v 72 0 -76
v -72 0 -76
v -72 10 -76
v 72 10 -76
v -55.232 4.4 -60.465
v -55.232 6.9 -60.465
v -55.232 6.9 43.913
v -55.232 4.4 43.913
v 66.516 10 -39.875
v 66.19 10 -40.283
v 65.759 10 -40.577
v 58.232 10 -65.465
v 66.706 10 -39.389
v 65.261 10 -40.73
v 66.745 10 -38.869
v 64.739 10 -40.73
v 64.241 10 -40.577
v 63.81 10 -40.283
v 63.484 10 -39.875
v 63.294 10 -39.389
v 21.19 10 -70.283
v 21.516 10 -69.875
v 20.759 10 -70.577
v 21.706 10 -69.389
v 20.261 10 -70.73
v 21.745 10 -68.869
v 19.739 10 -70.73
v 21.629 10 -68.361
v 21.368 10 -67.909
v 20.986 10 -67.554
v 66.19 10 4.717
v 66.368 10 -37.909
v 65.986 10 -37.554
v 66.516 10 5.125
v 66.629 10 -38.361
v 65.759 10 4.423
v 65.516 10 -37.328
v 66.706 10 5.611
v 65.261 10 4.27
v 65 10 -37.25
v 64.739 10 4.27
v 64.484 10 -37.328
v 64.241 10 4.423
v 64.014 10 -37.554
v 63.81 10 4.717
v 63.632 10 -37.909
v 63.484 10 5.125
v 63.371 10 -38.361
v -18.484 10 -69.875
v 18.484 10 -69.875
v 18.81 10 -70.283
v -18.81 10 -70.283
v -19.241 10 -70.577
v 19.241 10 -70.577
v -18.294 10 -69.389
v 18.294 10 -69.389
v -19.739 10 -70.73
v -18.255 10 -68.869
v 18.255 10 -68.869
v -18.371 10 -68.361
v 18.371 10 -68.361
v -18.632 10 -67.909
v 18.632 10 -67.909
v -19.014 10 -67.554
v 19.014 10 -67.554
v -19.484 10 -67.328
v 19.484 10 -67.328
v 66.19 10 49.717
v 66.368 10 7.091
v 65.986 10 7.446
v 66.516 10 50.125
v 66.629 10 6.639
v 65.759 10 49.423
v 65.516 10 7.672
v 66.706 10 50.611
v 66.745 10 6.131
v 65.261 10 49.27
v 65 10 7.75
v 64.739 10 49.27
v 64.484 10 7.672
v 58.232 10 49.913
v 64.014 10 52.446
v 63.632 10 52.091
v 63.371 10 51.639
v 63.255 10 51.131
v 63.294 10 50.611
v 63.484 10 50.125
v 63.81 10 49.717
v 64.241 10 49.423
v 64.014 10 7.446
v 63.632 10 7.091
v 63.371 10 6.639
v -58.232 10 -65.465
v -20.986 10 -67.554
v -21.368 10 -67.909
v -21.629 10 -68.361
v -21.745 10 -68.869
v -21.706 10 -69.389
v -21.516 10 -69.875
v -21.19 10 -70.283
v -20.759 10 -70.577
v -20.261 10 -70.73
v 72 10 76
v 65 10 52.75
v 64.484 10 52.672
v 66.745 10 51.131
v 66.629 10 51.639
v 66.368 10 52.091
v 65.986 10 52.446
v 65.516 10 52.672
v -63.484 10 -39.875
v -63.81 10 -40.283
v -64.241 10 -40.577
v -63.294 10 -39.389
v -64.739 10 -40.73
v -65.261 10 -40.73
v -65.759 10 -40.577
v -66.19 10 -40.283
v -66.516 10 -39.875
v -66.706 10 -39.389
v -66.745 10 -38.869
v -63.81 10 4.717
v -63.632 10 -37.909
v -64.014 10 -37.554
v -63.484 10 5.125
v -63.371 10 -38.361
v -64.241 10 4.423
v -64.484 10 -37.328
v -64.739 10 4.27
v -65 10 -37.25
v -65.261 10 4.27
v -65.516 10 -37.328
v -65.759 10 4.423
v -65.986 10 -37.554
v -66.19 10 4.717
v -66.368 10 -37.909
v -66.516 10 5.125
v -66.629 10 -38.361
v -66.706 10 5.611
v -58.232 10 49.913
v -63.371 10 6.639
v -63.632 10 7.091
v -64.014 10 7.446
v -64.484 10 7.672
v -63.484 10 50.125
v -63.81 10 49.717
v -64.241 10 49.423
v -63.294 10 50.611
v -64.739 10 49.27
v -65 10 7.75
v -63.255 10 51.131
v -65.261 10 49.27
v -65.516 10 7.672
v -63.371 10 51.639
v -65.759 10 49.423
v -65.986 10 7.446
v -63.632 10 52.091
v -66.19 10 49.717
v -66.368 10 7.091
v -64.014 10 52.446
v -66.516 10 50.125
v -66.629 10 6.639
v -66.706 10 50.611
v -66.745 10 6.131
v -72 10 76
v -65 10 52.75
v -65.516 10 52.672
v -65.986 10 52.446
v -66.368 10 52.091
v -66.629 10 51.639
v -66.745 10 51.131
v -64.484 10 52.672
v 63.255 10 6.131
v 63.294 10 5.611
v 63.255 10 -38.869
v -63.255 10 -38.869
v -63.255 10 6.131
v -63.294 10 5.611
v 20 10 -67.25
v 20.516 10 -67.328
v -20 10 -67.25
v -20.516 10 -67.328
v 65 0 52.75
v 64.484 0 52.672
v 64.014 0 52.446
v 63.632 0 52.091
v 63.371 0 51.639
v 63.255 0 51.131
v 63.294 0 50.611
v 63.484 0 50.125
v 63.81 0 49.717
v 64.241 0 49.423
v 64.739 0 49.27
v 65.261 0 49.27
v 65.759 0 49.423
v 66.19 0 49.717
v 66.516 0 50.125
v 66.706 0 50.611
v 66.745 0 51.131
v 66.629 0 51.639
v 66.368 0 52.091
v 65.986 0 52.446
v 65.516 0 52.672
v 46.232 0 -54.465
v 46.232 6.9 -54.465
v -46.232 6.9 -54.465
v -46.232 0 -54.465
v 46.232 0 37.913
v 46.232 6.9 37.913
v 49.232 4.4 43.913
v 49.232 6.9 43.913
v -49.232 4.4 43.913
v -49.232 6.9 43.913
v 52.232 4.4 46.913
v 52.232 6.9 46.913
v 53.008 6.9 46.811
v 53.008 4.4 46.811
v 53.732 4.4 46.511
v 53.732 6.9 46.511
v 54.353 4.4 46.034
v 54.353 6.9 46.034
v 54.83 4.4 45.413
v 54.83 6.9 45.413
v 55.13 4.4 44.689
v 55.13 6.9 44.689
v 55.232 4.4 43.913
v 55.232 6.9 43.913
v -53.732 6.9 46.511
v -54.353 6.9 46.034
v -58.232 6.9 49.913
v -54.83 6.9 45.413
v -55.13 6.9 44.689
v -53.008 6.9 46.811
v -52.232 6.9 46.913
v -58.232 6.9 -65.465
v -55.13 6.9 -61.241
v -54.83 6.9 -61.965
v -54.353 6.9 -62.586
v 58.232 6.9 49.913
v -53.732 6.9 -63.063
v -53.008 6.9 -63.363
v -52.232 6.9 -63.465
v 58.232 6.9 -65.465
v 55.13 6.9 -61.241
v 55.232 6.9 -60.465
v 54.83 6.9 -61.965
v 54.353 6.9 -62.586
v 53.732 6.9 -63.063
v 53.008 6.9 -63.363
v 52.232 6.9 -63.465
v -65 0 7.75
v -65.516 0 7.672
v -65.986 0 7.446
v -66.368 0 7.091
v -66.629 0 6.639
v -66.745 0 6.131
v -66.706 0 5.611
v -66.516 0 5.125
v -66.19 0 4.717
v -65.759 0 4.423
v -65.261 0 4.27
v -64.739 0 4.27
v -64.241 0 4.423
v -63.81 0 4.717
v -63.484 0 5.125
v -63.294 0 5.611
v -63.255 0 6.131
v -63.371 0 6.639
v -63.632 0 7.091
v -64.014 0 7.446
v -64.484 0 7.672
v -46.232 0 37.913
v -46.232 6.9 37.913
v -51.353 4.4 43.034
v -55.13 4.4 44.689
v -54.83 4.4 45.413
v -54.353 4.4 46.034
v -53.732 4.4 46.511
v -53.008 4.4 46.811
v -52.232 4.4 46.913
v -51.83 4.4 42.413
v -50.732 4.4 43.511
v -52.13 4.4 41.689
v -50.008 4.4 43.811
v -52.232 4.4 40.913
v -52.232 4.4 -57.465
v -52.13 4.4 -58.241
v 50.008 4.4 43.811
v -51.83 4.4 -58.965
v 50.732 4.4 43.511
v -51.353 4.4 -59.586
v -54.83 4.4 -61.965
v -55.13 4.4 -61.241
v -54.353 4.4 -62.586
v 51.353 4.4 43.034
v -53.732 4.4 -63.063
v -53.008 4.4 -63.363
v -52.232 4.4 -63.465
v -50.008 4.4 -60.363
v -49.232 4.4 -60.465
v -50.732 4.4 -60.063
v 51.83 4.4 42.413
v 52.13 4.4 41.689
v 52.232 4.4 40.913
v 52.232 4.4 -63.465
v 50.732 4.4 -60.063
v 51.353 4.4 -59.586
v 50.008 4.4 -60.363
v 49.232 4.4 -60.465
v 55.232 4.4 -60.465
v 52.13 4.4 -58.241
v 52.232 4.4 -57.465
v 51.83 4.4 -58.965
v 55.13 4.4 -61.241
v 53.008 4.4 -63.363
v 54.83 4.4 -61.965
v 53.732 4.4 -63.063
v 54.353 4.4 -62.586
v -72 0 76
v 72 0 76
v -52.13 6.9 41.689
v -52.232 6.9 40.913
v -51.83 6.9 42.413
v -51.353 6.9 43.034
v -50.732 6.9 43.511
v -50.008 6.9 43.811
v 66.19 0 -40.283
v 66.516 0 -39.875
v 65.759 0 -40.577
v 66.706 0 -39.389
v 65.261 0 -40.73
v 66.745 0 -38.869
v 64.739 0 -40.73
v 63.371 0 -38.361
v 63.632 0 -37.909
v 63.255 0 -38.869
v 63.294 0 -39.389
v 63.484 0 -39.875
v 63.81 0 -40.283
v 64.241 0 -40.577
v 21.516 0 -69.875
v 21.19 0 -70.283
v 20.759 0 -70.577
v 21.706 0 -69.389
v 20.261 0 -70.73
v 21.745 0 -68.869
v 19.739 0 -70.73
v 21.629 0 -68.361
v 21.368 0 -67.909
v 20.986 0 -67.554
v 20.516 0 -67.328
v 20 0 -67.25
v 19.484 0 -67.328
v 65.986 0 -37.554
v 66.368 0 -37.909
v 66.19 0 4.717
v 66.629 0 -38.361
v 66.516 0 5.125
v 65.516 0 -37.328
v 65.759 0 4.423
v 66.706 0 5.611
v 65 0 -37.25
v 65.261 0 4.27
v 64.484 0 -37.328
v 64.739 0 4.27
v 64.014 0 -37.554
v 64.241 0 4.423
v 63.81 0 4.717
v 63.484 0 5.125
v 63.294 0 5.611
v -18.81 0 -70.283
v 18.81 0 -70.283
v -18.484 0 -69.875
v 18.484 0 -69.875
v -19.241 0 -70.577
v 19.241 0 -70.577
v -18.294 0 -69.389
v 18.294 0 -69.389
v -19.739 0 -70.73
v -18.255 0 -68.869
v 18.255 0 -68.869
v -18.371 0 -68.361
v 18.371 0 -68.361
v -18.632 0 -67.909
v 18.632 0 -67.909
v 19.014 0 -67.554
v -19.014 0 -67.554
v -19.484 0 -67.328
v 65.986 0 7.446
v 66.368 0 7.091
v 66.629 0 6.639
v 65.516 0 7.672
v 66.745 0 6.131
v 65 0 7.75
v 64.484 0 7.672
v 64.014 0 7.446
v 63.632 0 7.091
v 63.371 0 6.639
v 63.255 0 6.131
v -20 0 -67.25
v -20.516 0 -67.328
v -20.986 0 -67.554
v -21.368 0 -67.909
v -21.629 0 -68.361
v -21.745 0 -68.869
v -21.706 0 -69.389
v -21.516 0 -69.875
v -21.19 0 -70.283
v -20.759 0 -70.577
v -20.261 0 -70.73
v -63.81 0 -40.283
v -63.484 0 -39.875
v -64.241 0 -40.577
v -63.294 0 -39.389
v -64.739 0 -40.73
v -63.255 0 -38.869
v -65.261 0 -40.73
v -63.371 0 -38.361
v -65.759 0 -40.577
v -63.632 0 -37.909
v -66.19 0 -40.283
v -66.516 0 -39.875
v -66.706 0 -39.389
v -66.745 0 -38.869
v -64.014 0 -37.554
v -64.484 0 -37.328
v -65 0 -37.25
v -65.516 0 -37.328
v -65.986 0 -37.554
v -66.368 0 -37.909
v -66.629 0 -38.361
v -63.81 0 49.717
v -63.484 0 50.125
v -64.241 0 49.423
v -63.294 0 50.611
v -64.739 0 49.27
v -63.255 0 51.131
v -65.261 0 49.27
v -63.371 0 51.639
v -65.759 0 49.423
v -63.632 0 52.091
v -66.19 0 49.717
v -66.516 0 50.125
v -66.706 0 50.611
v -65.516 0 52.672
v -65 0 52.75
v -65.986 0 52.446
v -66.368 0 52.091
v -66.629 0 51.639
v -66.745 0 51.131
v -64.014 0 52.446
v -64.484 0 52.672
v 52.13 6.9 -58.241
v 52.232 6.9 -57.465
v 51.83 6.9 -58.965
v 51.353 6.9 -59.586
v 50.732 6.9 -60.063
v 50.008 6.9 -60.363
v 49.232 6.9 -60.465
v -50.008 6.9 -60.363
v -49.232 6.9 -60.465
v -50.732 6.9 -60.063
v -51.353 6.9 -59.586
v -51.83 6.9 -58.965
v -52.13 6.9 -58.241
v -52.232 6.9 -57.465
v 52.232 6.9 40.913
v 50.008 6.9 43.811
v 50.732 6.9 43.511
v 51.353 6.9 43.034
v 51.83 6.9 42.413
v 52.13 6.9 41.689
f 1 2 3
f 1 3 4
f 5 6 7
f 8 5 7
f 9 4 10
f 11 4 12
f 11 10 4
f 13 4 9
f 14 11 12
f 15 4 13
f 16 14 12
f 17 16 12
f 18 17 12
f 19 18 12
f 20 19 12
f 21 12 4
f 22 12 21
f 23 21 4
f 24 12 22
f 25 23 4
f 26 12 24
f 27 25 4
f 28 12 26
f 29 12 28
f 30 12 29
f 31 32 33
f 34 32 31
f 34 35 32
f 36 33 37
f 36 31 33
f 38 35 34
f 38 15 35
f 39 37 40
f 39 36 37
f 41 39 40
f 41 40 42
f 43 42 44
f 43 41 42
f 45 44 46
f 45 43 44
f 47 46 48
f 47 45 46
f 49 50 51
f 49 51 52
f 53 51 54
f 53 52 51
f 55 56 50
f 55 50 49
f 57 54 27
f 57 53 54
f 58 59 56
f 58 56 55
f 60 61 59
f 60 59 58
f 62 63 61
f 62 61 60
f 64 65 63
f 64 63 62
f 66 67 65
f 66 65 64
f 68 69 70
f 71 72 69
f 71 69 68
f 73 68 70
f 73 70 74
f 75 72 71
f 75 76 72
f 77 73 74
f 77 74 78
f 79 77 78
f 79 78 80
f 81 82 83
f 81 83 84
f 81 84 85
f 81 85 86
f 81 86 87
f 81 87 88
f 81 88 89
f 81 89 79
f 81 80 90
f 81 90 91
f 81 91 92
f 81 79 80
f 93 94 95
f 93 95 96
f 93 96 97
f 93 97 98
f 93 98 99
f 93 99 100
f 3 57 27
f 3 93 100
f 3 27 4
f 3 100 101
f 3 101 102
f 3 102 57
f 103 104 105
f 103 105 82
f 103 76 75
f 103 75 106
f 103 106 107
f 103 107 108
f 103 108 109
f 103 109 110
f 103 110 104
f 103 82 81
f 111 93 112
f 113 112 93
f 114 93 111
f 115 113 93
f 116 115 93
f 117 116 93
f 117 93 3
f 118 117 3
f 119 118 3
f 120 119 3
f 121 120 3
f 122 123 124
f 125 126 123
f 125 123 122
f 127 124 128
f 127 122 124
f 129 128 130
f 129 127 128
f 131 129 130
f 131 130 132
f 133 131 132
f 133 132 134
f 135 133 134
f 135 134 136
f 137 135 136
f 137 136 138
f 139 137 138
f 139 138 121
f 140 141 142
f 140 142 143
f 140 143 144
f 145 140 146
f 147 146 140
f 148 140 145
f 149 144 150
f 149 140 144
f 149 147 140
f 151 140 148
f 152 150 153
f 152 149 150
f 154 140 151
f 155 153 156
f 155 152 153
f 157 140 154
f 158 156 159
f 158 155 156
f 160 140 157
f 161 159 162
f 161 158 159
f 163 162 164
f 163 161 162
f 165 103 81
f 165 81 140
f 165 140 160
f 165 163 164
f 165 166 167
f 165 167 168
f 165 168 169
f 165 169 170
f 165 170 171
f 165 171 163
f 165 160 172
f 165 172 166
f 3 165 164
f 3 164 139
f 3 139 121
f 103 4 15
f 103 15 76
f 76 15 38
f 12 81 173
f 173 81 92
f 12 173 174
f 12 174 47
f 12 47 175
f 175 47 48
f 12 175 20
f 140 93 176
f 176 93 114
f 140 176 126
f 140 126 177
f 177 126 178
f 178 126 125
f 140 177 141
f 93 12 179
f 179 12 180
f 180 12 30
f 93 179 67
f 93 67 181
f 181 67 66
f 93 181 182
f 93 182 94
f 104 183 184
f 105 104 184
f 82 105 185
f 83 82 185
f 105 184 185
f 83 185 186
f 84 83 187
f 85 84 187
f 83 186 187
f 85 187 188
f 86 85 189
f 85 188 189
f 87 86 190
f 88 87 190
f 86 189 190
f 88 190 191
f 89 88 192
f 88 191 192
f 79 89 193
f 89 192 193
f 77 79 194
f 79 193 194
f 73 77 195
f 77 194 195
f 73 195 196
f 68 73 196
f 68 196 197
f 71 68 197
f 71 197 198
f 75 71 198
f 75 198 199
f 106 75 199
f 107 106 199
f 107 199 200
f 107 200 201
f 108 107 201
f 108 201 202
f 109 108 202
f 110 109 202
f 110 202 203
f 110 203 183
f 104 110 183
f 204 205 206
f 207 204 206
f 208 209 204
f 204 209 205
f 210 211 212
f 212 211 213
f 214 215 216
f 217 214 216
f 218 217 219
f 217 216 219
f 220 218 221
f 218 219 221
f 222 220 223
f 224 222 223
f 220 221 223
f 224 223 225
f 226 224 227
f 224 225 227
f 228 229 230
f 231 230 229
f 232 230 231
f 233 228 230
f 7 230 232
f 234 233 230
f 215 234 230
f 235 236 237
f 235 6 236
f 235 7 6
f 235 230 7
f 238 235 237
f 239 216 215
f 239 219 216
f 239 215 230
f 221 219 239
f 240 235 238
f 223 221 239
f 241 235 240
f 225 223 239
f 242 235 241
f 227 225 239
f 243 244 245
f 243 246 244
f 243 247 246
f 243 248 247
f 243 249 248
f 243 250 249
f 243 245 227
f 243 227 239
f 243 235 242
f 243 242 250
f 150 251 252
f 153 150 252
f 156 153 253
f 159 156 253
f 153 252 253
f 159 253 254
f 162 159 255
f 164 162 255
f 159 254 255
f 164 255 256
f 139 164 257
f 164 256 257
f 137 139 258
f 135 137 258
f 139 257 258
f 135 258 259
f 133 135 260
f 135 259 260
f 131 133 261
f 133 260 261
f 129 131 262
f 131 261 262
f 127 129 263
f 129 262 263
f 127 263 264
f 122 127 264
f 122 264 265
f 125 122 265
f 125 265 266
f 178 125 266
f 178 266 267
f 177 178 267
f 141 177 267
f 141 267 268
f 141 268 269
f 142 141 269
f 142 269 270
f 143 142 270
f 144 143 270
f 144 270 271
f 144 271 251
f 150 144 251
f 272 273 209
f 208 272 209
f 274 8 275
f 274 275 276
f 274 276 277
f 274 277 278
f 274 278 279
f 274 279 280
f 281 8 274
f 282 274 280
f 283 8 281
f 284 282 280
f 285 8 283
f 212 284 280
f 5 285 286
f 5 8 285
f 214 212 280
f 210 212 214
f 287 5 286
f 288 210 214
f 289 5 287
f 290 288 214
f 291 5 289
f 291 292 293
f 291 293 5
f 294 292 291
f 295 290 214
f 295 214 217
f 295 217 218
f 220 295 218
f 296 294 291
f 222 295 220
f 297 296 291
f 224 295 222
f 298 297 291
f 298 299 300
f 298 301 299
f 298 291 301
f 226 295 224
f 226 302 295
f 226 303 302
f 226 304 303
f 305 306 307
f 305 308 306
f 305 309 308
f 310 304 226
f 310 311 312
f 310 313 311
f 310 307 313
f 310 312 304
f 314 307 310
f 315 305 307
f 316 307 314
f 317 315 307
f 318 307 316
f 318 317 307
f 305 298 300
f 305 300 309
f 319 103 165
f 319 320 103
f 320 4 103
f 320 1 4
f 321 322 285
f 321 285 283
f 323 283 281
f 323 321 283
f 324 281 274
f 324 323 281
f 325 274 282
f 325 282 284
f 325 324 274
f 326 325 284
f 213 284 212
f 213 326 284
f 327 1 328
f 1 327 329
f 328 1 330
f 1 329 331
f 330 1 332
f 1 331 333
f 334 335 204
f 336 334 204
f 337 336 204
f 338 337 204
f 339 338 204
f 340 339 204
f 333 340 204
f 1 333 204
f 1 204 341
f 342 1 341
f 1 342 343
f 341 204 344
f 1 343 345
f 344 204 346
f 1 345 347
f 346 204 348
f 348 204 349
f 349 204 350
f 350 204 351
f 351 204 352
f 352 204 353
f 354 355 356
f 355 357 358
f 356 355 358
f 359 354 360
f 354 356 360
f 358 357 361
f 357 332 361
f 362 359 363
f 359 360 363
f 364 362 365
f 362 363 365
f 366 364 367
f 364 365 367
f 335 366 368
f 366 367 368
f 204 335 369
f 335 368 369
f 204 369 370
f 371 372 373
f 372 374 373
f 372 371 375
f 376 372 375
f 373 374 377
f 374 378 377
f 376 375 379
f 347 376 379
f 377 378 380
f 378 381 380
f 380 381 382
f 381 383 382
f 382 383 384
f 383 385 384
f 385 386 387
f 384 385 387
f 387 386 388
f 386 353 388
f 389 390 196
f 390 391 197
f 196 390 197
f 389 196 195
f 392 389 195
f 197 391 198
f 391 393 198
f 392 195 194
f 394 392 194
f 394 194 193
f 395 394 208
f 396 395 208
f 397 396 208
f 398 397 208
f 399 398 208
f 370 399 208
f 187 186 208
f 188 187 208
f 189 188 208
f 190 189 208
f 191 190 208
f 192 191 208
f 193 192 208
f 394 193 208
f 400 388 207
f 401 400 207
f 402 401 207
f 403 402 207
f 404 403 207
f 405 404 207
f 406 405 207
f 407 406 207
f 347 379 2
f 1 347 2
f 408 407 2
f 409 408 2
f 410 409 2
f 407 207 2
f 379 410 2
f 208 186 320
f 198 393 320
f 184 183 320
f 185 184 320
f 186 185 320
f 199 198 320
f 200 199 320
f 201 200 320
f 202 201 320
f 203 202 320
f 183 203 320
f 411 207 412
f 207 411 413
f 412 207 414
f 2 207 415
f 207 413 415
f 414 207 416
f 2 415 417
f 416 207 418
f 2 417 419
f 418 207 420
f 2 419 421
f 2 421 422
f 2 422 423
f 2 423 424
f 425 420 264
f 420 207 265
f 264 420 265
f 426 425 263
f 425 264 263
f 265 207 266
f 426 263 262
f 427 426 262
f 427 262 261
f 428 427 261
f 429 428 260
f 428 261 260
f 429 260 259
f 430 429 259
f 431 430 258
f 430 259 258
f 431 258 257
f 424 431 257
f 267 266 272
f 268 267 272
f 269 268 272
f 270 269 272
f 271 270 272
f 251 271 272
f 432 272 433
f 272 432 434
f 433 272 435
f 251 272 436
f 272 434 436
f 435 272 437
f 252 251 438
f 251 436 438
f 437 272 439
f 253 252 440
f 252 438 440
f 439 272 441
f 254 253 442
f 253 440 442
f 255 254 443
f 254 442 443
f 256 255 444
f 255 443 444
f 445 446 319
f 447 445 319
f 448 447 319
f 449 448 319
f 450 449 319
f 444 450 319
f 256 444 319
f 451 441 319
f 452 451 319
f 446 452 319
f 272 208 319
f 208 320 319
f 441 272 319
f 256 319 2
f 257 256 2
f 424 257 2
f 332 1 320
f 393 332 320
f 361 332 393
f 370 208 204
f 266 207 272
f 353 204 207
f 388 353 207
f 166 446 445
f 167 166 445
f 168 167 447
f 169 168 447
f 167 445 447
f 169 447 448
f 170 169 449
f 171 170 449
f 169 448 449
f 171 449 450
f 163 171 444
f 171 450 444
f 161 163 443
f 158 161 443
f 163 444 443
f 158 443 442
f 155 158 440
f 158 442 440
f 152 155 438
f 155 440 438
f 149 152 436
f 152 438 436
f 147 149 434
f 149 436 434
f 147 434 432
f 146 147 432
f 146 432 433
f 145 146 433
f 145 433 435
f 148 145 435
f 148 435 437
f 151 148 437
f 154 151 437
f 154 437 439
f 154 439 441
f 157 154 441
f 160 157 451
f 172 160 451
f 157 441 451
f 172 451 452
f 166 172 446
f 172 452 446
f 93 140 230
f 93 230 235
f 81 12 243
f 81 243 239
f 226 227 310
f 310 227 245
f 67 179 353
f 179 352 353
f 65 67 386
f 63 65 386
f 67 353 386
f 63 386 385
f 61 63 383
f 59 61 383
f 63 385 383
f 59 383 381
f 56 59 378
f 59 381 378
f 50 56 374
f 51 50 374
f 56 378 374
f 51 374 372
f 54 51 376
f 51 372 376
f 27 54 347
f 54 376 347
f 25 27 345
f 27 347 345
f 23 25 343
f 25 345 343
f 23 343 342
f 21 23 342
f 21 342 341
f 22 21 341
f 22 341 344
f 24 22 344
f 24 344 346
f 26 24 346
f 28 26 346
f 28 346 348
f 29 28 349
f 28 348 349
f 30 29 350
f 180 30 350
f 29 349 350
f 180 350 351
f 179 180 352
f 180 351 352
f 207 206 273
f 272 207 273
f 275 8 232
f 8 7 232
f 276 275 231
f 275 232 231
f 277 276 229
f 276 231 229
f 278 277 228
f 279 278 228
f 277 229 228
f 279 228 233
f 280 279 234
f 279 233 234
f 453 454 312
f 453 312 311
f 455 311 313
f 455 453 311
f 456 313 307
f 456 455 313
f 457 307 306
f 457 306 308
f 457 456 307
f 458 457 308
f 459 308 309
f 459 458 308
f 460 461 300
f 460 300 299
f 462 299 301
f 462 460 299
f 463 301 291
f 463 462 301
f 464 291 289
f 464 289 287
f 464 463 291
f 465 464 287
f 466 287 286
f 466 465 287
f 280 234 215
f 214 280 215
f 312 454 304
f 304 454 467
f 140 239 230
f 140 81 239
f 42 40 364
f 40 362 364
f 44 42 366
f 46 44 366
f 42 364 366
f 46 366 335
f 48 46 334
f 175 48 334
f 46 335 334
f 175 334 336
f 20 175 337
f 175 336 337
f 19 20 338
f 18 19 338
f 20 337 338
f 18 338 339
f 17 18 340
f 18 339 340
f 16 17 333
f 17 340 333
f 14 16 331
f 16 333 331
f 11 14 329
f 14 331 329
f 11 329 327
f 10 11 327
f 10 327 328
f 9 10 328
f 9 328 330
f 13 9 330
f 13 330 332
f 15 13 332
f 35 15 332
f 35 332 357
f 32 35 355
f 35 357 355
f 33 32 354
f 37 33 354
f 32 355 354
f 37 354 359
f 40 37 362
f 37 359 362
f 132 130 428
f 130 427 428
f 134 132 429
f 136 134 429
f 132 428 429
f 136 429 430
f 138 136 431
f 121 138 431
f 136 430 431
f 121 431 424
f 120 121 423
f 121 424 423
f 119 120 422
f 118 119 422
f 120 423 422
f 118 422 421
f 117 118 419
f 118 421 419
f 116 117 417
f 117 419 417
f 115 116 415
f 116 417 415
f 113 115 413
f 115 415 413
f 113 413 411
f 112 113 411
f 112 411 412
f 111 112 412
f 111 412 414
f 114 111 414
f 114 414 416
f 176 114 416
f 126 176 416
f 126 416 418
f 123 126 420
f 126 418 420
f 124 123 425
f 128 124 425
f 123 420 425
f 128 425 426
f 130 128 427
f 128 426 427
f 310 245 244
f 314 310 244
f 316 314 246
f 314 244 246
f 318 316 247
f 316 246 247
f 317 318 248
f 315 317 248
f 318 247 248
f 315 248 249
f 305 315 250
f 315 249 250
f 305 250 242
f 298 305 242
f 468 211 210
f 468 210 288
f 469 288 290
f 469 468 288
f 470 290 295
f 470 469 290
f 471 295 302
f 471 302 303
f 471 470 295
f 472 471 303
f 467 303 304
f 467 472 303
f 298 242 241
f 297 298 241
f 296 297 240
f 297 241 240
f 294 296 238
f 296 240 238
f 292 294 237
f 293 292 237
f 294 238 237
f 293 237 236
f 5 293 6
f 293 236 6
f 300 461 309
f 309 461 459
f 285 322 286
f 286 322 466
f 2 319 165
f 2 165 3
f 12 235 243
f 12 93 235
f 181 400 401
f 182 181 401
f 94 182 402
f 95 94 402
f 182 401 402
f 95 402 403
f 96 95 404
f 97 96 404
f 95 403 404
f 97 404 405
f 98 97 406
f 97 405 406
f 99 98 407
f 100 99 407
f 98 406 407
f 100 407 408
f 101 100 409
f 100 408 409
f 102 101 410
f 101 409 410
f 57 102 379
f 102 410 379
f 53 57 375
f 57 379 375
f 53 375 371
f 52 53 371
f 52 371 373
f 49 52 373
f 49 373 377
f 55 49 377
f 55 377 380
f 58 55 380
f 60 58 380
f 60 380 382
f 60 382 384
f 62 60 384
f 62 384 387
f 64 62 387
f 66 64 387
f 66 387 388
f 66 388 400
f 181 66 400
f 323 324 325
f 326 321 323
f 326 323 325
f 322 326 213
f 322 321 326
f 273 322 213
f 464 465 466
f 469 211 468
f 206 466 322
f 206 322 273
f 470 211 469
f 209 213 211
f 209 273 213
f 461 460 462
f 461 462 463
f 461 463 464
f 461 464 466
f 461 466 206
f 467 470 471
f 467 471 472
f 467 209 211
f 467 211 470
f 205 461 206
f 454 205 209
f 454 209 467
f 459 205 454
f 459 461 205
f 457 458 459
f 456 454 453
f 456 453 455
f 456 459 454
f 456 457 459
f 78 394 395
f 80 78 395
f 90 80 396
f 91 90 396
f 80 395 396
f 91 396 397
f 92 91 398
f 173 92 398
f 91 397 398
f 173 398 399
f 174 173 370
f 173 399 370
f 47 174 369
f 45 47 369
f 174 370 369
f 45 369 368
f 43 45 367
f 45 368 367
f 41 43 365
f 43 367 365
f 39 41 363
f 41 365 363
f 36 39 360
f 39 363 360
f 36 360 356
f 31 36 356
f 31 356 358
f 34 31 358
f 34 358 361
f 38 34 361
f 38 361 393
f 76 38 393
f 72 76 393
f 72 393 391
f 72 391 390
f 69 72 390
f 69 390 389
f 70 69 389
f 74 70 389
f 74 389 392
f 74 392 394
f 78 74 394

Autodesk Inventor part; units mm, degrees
ref_plane "YZ Plane" through (0, 0, 0) normal (1, 0, 0) x (0, 1, 0)
ref_plane "XZ Plane" through (0, 0, 0) normal (0, 1, 0) x (-1, 0, 0)
ref_plane "XY Plane" through (0, 0, 0) normal (0, 0, 1) x (1, 0, 0)
sketch "Sketch1" plane through (0, 0, 0) normal (0, 1, 0) x (-1, 0, 0)
  line L0 (72, -76) -> (-72, -76)
  line L1 (-72, -76) -> (-72, 76)
  line L2 (-72, 76) -> (72, 76)
  line L3 (72, 76) -> (72, -76)
  line L4 (72, -76) -> (-72, 76) construction
  line L5 (-72, -76) -> (72, 76) construction
  point P0 (0, 0)
  dimension "d3" = 152
  dimension "d4" = 144
extrude "Extrusion1" add sketch "Sketch1" along normal blind 10
sketch "Sketch2" plane through (0, 10, 0) normal (0, 1, 0) x (1, 0, 0)
  line L0 (-9.5175, -400.0105) -> (-9.5175, -295.6322)
  line L1 (-12.5175, -292.6322) -> (-116.9815, -292.6322)
  line L2 (-119.9815, -295.6322) -> (-119.9815, -400.0105)
  line L3 (-116.9815, -403.0105) -> (-12.5175, -403.0105)
  circle A0 centre (0.2505, -407.097) radius 1.7294
  circle A1 centre (-129.7495, -407.097) radius 1.7294
  circle A2 centre (-84.7495, -287.097) radius 1.7294
  line L4 (-18.5175, -301.6322) -> (-110.9815, -301.6322)
  line L5 (-18.5175, -394.0105) -> (-18.5175, -301.6322)
  line L6 (-110.9815, -301.6322) -> (-110.9815, -394.0105)
  line L7 (-110.9815, -394.0105) -> (-18.5175, -394.0105)
  line L8 (-12.5175, -298.6322) -> (-12.5175, -397.0105)
  line L9 (-15.5175, -400.0105) -> (-113.9815, -400.0105)
  line L10 (-116.9815, -397.0105) -> (-116.9815, -298.6322)
  line L11 (-113.9815, -295.6322) -> (-15.5175, -295.6322)
  arc A3 (-116.9815, -397.0105) -> (-113.9815, -400.0105) centre (-113.9815, -397.0105) ccw
  arc A4 (-119.9815, -400.0105) -> (-116.9815, -403.0105) centre (-116.9815, -400.0105) ccw
  arc A5 (-15.5175, -400.0105) -> (-12.5175, -397.0105) centre (-15.5175, -397.0105) ccw
  arc A6 (-12.5175, -403.0105) -> (-9.5175, -400.0105) centre (-12.5175, -400.0105) ccw
  arc A7 (-9.5175, -295.6322) -> (-12.5175, -292.6322) centre (-12.5175, -295.6322) ccw
  arc A8 (-12.5175, -298.6322) -> (-15.5175, -295.6322) centre (-15.5175, -298.6322) ccw
  arc A9 (-116.9815, -292.6322) -> (-119.9815, -295.6322) centre (-116.9815, -295.6322) ccw
  arc A10 (-113.9815, -295.6322) -> (-116.9815, -298.6322) centre (-113.9815, -298.6322) ccw
  line L12 (-46.232, -37.913) -> (46.232, -37.913)
  line L13 (46.232, -37.913) -> (46.232, 54.465)
  line L14 (46.232, 54.465) -> (-46.232, 54.465)
  line L15 (-46.232, 54.465) -> (-46.232, -37.913)
  line L16 (72, -76) -> (72, 76) construction
  line L17 (72, 76) -> (-72, 76) construction
  point P0 (0, 0)
  point P1 (-67.2495, -360.597)
  dimension "d7" = 9
  dimension "d8" = 9
  dimension "d9" = 9
  dimension "d10" = 9
  dimension "d11" = 3
  dimension "d12" = 3
  dimension "d13" = 92.378
  dimension "d14" = 92.464
  dimension "d15" = 25.768
  dimension "d16" = 21.535
  dimension "d19" = 144
  dimension "d20" = 152
extrude "Extrusion2" cut sketch "Sketch2" against normal blind 10 contours L15 L14 L13 L12
sketch "Sketch3" plane through (0, 10, 0) normal (0, 1, 0) x (1, 0, 0)
  line L0 (-46.232, 54.465) -> (46.232, 54.465) construction
  line L1 (72, -76) -> (72, 76) construction
  line L2 (-72, 76) -> (-72, -76) construction
  line L3 (-72, -76) -> (72, -76) construction
  line L4 (72, 76) -> (-72, 76) construction
  point P0 (0, 0)
  point P1 (0, 0)
  point P2 (-65, -6)
  point P3 (-65, 39)
  point P4 (-65, -51)
  point P5 (65, -6)
  point P6 (65, 39)
  point P7 (65, -51)
  point P8 (-20, 69)
  point P9 (20, 69)
  dimension "d21" = 45
  dimension "d22" = 45
  dimension "d23" = 45
  dimension "d24" = 45
  dimension "d25" = 14.535
  dimension "d26" = 14.535
  dimension "d27" = 40
  dimension "d28" = 52
  dimension "d29" = 7
  dimension "d30" = 7
  dimension "d31" = 7
  dimension "d32" = 7
  dimension "d33" = 7
  dimension "d34" = 25
  dimension "d36" = 25
hole "Hole1" at (-65, 10, 6) at (-65, 10, -39) at (-65, 10, 51) at (65, 10, 6) at (65, 10, -39) at (65, 10, 51) at (-20, 10, -69) at (20, 10, -69) direction (0, -1, 0) diameter 3.5 end through all
sketch "Sketch4" plane through (0, 10, 0) normal (0, 1, 0) x (1, 0, 0)
  line L0 (55.232, -43.913) -> (55.232, 60.465)
  line L1 (52.232, 63.465) -> (-52.232, 63.465)
  line L2 (-55.232, 60.465) -> (-55.232, -43.913)
  line L3 (-52.232, -46.913) -> (52.232, -46.913)
  circle A0 centre (502.0315, -140.3134) radius 1.7294
  circle A1 centre (372.0315, -140.3134) radius 1.7294
  circle A2 centre (417.0315, -20.3134) radius 1.7294
  line L4 (46.232, 54.465) -> (-46.232, 54.465)
  line L5 (46.232, -37.913) -> (46.232, 54.465)
  line L6 (-46.232, 54.465) -> (-46.232, -37.913)
  line L7 (-46.232, -37.913) -> (46.232, -37.913)
  line L8 (52.232, 57.465) -> (52.232, -40.913)
  line L9 (49.232, -43.913) -> (-49.232, -43.913)
  line L10 (-52.232, -40.913) -> (-52.232, 57.465)
  line L11 (-49.232, 60.465) -> (49.232, 60.465)
  arc A3 (-52.232, -40.913) -> (-49.232, -43.913) centre (-49.232, -40.913) ccw
  arc A4 (-55.232, -43.913) -> (-52.232, -46.913) centre (-52.232, -43.913) ccw
  arc A5 (49.232, -43.913) -> (52.232, -40.913) centre (49.232, -40.913) ccw
  arc A6 (52.232, -46.913) -> (55.232, -43.913) centre (52.232, -43.913) ccw
  arc A7 (55.232, 60.465) -> (52.232, 63.465) centre (52.232, 60.465) ccw
  arc A8 (52.232, 57.465) -> (49.232, 60.465) centre (49.232, 57.465) ccw
  arc A9 (-52.232, 63.465) -> (-55.232, 60.465) centre (-52.232, 60.465) ccw
  arc A10 (-49.232, 60.465) -> (-52.232, 57.465) centre (-49.232, 57.465) ccw
  line L12 (-46.232, 54.465) -> (46.232, 54.465) projected
  line L13 (46.232, -37.913) -> (-46.232, -37.913) projected
  line L14 (46.232, 54.465) -> (46.232, -37.913) projected
  line L15 (-46.232, -37.913) -> (-46.232, 54.465) projected
  point P0 (0, 0)
  point P1 (-14.6695, 0.7102)
  dimension "d44" = 9
  dimension "d45" = 9
  dimension "d46" = 9
  dimension "d47" = 9
  dimension "d48" = 3
  dimension "d49" = 3
  dimension "d51" = 0
  dimension "d52" = 0
  dimension "d53" = 0
  dimension "d54" = 0
extrude "Extrusion3" cut sketch "Sketch4" against normal blind 2.5 contours A6 L3 A4 L2 A9 L1 A7 L0
sketch "Sketch5" plane through (0, 10, 0) normal (0, 1, 0) x (1, 0, 0)
  line L0 (58.232, -49.913) -> (-58.232, -49.913)
  line L1 (-58.232, -49.913) -> (-58.232, 65.465)
  line L2 (-58.232, 65.465) -> (58.232, 65.465)
  line L3 (58.232, 65.465) -> (58.232, -49.913)
  line L4 (72, 76) -> (-72, 76) projected
  line L5 (-55.232, -43.913) -> (-55.232, 60.465) projected
  line L6 (55.232, 60.465) -> (55.232, -43.913) projected
  line L7 (52.232, -46.913) -> (-52.232, -46.913) projected
  line L8 (-52.232, 63.465) -> (52.232, 63.465) projected
  point P0 (0, 0)
  point P1 (58.232, 76)
  point P2 (-58.232, 76)
  dimension "d58" = 3
  dimension "d59" = 3
  dimension "d60" = 3
  dimension "d65" = 2
extrude "Extrusion4" cut sketch "Sketch5" against normal blind 3.1
extrude "Extrusion5" cut sketch "Sketch4" against normal blind 5.6 contours A6 L3 A4 L2 A9 L1 A7 L0
properties part number "Glass holder"
